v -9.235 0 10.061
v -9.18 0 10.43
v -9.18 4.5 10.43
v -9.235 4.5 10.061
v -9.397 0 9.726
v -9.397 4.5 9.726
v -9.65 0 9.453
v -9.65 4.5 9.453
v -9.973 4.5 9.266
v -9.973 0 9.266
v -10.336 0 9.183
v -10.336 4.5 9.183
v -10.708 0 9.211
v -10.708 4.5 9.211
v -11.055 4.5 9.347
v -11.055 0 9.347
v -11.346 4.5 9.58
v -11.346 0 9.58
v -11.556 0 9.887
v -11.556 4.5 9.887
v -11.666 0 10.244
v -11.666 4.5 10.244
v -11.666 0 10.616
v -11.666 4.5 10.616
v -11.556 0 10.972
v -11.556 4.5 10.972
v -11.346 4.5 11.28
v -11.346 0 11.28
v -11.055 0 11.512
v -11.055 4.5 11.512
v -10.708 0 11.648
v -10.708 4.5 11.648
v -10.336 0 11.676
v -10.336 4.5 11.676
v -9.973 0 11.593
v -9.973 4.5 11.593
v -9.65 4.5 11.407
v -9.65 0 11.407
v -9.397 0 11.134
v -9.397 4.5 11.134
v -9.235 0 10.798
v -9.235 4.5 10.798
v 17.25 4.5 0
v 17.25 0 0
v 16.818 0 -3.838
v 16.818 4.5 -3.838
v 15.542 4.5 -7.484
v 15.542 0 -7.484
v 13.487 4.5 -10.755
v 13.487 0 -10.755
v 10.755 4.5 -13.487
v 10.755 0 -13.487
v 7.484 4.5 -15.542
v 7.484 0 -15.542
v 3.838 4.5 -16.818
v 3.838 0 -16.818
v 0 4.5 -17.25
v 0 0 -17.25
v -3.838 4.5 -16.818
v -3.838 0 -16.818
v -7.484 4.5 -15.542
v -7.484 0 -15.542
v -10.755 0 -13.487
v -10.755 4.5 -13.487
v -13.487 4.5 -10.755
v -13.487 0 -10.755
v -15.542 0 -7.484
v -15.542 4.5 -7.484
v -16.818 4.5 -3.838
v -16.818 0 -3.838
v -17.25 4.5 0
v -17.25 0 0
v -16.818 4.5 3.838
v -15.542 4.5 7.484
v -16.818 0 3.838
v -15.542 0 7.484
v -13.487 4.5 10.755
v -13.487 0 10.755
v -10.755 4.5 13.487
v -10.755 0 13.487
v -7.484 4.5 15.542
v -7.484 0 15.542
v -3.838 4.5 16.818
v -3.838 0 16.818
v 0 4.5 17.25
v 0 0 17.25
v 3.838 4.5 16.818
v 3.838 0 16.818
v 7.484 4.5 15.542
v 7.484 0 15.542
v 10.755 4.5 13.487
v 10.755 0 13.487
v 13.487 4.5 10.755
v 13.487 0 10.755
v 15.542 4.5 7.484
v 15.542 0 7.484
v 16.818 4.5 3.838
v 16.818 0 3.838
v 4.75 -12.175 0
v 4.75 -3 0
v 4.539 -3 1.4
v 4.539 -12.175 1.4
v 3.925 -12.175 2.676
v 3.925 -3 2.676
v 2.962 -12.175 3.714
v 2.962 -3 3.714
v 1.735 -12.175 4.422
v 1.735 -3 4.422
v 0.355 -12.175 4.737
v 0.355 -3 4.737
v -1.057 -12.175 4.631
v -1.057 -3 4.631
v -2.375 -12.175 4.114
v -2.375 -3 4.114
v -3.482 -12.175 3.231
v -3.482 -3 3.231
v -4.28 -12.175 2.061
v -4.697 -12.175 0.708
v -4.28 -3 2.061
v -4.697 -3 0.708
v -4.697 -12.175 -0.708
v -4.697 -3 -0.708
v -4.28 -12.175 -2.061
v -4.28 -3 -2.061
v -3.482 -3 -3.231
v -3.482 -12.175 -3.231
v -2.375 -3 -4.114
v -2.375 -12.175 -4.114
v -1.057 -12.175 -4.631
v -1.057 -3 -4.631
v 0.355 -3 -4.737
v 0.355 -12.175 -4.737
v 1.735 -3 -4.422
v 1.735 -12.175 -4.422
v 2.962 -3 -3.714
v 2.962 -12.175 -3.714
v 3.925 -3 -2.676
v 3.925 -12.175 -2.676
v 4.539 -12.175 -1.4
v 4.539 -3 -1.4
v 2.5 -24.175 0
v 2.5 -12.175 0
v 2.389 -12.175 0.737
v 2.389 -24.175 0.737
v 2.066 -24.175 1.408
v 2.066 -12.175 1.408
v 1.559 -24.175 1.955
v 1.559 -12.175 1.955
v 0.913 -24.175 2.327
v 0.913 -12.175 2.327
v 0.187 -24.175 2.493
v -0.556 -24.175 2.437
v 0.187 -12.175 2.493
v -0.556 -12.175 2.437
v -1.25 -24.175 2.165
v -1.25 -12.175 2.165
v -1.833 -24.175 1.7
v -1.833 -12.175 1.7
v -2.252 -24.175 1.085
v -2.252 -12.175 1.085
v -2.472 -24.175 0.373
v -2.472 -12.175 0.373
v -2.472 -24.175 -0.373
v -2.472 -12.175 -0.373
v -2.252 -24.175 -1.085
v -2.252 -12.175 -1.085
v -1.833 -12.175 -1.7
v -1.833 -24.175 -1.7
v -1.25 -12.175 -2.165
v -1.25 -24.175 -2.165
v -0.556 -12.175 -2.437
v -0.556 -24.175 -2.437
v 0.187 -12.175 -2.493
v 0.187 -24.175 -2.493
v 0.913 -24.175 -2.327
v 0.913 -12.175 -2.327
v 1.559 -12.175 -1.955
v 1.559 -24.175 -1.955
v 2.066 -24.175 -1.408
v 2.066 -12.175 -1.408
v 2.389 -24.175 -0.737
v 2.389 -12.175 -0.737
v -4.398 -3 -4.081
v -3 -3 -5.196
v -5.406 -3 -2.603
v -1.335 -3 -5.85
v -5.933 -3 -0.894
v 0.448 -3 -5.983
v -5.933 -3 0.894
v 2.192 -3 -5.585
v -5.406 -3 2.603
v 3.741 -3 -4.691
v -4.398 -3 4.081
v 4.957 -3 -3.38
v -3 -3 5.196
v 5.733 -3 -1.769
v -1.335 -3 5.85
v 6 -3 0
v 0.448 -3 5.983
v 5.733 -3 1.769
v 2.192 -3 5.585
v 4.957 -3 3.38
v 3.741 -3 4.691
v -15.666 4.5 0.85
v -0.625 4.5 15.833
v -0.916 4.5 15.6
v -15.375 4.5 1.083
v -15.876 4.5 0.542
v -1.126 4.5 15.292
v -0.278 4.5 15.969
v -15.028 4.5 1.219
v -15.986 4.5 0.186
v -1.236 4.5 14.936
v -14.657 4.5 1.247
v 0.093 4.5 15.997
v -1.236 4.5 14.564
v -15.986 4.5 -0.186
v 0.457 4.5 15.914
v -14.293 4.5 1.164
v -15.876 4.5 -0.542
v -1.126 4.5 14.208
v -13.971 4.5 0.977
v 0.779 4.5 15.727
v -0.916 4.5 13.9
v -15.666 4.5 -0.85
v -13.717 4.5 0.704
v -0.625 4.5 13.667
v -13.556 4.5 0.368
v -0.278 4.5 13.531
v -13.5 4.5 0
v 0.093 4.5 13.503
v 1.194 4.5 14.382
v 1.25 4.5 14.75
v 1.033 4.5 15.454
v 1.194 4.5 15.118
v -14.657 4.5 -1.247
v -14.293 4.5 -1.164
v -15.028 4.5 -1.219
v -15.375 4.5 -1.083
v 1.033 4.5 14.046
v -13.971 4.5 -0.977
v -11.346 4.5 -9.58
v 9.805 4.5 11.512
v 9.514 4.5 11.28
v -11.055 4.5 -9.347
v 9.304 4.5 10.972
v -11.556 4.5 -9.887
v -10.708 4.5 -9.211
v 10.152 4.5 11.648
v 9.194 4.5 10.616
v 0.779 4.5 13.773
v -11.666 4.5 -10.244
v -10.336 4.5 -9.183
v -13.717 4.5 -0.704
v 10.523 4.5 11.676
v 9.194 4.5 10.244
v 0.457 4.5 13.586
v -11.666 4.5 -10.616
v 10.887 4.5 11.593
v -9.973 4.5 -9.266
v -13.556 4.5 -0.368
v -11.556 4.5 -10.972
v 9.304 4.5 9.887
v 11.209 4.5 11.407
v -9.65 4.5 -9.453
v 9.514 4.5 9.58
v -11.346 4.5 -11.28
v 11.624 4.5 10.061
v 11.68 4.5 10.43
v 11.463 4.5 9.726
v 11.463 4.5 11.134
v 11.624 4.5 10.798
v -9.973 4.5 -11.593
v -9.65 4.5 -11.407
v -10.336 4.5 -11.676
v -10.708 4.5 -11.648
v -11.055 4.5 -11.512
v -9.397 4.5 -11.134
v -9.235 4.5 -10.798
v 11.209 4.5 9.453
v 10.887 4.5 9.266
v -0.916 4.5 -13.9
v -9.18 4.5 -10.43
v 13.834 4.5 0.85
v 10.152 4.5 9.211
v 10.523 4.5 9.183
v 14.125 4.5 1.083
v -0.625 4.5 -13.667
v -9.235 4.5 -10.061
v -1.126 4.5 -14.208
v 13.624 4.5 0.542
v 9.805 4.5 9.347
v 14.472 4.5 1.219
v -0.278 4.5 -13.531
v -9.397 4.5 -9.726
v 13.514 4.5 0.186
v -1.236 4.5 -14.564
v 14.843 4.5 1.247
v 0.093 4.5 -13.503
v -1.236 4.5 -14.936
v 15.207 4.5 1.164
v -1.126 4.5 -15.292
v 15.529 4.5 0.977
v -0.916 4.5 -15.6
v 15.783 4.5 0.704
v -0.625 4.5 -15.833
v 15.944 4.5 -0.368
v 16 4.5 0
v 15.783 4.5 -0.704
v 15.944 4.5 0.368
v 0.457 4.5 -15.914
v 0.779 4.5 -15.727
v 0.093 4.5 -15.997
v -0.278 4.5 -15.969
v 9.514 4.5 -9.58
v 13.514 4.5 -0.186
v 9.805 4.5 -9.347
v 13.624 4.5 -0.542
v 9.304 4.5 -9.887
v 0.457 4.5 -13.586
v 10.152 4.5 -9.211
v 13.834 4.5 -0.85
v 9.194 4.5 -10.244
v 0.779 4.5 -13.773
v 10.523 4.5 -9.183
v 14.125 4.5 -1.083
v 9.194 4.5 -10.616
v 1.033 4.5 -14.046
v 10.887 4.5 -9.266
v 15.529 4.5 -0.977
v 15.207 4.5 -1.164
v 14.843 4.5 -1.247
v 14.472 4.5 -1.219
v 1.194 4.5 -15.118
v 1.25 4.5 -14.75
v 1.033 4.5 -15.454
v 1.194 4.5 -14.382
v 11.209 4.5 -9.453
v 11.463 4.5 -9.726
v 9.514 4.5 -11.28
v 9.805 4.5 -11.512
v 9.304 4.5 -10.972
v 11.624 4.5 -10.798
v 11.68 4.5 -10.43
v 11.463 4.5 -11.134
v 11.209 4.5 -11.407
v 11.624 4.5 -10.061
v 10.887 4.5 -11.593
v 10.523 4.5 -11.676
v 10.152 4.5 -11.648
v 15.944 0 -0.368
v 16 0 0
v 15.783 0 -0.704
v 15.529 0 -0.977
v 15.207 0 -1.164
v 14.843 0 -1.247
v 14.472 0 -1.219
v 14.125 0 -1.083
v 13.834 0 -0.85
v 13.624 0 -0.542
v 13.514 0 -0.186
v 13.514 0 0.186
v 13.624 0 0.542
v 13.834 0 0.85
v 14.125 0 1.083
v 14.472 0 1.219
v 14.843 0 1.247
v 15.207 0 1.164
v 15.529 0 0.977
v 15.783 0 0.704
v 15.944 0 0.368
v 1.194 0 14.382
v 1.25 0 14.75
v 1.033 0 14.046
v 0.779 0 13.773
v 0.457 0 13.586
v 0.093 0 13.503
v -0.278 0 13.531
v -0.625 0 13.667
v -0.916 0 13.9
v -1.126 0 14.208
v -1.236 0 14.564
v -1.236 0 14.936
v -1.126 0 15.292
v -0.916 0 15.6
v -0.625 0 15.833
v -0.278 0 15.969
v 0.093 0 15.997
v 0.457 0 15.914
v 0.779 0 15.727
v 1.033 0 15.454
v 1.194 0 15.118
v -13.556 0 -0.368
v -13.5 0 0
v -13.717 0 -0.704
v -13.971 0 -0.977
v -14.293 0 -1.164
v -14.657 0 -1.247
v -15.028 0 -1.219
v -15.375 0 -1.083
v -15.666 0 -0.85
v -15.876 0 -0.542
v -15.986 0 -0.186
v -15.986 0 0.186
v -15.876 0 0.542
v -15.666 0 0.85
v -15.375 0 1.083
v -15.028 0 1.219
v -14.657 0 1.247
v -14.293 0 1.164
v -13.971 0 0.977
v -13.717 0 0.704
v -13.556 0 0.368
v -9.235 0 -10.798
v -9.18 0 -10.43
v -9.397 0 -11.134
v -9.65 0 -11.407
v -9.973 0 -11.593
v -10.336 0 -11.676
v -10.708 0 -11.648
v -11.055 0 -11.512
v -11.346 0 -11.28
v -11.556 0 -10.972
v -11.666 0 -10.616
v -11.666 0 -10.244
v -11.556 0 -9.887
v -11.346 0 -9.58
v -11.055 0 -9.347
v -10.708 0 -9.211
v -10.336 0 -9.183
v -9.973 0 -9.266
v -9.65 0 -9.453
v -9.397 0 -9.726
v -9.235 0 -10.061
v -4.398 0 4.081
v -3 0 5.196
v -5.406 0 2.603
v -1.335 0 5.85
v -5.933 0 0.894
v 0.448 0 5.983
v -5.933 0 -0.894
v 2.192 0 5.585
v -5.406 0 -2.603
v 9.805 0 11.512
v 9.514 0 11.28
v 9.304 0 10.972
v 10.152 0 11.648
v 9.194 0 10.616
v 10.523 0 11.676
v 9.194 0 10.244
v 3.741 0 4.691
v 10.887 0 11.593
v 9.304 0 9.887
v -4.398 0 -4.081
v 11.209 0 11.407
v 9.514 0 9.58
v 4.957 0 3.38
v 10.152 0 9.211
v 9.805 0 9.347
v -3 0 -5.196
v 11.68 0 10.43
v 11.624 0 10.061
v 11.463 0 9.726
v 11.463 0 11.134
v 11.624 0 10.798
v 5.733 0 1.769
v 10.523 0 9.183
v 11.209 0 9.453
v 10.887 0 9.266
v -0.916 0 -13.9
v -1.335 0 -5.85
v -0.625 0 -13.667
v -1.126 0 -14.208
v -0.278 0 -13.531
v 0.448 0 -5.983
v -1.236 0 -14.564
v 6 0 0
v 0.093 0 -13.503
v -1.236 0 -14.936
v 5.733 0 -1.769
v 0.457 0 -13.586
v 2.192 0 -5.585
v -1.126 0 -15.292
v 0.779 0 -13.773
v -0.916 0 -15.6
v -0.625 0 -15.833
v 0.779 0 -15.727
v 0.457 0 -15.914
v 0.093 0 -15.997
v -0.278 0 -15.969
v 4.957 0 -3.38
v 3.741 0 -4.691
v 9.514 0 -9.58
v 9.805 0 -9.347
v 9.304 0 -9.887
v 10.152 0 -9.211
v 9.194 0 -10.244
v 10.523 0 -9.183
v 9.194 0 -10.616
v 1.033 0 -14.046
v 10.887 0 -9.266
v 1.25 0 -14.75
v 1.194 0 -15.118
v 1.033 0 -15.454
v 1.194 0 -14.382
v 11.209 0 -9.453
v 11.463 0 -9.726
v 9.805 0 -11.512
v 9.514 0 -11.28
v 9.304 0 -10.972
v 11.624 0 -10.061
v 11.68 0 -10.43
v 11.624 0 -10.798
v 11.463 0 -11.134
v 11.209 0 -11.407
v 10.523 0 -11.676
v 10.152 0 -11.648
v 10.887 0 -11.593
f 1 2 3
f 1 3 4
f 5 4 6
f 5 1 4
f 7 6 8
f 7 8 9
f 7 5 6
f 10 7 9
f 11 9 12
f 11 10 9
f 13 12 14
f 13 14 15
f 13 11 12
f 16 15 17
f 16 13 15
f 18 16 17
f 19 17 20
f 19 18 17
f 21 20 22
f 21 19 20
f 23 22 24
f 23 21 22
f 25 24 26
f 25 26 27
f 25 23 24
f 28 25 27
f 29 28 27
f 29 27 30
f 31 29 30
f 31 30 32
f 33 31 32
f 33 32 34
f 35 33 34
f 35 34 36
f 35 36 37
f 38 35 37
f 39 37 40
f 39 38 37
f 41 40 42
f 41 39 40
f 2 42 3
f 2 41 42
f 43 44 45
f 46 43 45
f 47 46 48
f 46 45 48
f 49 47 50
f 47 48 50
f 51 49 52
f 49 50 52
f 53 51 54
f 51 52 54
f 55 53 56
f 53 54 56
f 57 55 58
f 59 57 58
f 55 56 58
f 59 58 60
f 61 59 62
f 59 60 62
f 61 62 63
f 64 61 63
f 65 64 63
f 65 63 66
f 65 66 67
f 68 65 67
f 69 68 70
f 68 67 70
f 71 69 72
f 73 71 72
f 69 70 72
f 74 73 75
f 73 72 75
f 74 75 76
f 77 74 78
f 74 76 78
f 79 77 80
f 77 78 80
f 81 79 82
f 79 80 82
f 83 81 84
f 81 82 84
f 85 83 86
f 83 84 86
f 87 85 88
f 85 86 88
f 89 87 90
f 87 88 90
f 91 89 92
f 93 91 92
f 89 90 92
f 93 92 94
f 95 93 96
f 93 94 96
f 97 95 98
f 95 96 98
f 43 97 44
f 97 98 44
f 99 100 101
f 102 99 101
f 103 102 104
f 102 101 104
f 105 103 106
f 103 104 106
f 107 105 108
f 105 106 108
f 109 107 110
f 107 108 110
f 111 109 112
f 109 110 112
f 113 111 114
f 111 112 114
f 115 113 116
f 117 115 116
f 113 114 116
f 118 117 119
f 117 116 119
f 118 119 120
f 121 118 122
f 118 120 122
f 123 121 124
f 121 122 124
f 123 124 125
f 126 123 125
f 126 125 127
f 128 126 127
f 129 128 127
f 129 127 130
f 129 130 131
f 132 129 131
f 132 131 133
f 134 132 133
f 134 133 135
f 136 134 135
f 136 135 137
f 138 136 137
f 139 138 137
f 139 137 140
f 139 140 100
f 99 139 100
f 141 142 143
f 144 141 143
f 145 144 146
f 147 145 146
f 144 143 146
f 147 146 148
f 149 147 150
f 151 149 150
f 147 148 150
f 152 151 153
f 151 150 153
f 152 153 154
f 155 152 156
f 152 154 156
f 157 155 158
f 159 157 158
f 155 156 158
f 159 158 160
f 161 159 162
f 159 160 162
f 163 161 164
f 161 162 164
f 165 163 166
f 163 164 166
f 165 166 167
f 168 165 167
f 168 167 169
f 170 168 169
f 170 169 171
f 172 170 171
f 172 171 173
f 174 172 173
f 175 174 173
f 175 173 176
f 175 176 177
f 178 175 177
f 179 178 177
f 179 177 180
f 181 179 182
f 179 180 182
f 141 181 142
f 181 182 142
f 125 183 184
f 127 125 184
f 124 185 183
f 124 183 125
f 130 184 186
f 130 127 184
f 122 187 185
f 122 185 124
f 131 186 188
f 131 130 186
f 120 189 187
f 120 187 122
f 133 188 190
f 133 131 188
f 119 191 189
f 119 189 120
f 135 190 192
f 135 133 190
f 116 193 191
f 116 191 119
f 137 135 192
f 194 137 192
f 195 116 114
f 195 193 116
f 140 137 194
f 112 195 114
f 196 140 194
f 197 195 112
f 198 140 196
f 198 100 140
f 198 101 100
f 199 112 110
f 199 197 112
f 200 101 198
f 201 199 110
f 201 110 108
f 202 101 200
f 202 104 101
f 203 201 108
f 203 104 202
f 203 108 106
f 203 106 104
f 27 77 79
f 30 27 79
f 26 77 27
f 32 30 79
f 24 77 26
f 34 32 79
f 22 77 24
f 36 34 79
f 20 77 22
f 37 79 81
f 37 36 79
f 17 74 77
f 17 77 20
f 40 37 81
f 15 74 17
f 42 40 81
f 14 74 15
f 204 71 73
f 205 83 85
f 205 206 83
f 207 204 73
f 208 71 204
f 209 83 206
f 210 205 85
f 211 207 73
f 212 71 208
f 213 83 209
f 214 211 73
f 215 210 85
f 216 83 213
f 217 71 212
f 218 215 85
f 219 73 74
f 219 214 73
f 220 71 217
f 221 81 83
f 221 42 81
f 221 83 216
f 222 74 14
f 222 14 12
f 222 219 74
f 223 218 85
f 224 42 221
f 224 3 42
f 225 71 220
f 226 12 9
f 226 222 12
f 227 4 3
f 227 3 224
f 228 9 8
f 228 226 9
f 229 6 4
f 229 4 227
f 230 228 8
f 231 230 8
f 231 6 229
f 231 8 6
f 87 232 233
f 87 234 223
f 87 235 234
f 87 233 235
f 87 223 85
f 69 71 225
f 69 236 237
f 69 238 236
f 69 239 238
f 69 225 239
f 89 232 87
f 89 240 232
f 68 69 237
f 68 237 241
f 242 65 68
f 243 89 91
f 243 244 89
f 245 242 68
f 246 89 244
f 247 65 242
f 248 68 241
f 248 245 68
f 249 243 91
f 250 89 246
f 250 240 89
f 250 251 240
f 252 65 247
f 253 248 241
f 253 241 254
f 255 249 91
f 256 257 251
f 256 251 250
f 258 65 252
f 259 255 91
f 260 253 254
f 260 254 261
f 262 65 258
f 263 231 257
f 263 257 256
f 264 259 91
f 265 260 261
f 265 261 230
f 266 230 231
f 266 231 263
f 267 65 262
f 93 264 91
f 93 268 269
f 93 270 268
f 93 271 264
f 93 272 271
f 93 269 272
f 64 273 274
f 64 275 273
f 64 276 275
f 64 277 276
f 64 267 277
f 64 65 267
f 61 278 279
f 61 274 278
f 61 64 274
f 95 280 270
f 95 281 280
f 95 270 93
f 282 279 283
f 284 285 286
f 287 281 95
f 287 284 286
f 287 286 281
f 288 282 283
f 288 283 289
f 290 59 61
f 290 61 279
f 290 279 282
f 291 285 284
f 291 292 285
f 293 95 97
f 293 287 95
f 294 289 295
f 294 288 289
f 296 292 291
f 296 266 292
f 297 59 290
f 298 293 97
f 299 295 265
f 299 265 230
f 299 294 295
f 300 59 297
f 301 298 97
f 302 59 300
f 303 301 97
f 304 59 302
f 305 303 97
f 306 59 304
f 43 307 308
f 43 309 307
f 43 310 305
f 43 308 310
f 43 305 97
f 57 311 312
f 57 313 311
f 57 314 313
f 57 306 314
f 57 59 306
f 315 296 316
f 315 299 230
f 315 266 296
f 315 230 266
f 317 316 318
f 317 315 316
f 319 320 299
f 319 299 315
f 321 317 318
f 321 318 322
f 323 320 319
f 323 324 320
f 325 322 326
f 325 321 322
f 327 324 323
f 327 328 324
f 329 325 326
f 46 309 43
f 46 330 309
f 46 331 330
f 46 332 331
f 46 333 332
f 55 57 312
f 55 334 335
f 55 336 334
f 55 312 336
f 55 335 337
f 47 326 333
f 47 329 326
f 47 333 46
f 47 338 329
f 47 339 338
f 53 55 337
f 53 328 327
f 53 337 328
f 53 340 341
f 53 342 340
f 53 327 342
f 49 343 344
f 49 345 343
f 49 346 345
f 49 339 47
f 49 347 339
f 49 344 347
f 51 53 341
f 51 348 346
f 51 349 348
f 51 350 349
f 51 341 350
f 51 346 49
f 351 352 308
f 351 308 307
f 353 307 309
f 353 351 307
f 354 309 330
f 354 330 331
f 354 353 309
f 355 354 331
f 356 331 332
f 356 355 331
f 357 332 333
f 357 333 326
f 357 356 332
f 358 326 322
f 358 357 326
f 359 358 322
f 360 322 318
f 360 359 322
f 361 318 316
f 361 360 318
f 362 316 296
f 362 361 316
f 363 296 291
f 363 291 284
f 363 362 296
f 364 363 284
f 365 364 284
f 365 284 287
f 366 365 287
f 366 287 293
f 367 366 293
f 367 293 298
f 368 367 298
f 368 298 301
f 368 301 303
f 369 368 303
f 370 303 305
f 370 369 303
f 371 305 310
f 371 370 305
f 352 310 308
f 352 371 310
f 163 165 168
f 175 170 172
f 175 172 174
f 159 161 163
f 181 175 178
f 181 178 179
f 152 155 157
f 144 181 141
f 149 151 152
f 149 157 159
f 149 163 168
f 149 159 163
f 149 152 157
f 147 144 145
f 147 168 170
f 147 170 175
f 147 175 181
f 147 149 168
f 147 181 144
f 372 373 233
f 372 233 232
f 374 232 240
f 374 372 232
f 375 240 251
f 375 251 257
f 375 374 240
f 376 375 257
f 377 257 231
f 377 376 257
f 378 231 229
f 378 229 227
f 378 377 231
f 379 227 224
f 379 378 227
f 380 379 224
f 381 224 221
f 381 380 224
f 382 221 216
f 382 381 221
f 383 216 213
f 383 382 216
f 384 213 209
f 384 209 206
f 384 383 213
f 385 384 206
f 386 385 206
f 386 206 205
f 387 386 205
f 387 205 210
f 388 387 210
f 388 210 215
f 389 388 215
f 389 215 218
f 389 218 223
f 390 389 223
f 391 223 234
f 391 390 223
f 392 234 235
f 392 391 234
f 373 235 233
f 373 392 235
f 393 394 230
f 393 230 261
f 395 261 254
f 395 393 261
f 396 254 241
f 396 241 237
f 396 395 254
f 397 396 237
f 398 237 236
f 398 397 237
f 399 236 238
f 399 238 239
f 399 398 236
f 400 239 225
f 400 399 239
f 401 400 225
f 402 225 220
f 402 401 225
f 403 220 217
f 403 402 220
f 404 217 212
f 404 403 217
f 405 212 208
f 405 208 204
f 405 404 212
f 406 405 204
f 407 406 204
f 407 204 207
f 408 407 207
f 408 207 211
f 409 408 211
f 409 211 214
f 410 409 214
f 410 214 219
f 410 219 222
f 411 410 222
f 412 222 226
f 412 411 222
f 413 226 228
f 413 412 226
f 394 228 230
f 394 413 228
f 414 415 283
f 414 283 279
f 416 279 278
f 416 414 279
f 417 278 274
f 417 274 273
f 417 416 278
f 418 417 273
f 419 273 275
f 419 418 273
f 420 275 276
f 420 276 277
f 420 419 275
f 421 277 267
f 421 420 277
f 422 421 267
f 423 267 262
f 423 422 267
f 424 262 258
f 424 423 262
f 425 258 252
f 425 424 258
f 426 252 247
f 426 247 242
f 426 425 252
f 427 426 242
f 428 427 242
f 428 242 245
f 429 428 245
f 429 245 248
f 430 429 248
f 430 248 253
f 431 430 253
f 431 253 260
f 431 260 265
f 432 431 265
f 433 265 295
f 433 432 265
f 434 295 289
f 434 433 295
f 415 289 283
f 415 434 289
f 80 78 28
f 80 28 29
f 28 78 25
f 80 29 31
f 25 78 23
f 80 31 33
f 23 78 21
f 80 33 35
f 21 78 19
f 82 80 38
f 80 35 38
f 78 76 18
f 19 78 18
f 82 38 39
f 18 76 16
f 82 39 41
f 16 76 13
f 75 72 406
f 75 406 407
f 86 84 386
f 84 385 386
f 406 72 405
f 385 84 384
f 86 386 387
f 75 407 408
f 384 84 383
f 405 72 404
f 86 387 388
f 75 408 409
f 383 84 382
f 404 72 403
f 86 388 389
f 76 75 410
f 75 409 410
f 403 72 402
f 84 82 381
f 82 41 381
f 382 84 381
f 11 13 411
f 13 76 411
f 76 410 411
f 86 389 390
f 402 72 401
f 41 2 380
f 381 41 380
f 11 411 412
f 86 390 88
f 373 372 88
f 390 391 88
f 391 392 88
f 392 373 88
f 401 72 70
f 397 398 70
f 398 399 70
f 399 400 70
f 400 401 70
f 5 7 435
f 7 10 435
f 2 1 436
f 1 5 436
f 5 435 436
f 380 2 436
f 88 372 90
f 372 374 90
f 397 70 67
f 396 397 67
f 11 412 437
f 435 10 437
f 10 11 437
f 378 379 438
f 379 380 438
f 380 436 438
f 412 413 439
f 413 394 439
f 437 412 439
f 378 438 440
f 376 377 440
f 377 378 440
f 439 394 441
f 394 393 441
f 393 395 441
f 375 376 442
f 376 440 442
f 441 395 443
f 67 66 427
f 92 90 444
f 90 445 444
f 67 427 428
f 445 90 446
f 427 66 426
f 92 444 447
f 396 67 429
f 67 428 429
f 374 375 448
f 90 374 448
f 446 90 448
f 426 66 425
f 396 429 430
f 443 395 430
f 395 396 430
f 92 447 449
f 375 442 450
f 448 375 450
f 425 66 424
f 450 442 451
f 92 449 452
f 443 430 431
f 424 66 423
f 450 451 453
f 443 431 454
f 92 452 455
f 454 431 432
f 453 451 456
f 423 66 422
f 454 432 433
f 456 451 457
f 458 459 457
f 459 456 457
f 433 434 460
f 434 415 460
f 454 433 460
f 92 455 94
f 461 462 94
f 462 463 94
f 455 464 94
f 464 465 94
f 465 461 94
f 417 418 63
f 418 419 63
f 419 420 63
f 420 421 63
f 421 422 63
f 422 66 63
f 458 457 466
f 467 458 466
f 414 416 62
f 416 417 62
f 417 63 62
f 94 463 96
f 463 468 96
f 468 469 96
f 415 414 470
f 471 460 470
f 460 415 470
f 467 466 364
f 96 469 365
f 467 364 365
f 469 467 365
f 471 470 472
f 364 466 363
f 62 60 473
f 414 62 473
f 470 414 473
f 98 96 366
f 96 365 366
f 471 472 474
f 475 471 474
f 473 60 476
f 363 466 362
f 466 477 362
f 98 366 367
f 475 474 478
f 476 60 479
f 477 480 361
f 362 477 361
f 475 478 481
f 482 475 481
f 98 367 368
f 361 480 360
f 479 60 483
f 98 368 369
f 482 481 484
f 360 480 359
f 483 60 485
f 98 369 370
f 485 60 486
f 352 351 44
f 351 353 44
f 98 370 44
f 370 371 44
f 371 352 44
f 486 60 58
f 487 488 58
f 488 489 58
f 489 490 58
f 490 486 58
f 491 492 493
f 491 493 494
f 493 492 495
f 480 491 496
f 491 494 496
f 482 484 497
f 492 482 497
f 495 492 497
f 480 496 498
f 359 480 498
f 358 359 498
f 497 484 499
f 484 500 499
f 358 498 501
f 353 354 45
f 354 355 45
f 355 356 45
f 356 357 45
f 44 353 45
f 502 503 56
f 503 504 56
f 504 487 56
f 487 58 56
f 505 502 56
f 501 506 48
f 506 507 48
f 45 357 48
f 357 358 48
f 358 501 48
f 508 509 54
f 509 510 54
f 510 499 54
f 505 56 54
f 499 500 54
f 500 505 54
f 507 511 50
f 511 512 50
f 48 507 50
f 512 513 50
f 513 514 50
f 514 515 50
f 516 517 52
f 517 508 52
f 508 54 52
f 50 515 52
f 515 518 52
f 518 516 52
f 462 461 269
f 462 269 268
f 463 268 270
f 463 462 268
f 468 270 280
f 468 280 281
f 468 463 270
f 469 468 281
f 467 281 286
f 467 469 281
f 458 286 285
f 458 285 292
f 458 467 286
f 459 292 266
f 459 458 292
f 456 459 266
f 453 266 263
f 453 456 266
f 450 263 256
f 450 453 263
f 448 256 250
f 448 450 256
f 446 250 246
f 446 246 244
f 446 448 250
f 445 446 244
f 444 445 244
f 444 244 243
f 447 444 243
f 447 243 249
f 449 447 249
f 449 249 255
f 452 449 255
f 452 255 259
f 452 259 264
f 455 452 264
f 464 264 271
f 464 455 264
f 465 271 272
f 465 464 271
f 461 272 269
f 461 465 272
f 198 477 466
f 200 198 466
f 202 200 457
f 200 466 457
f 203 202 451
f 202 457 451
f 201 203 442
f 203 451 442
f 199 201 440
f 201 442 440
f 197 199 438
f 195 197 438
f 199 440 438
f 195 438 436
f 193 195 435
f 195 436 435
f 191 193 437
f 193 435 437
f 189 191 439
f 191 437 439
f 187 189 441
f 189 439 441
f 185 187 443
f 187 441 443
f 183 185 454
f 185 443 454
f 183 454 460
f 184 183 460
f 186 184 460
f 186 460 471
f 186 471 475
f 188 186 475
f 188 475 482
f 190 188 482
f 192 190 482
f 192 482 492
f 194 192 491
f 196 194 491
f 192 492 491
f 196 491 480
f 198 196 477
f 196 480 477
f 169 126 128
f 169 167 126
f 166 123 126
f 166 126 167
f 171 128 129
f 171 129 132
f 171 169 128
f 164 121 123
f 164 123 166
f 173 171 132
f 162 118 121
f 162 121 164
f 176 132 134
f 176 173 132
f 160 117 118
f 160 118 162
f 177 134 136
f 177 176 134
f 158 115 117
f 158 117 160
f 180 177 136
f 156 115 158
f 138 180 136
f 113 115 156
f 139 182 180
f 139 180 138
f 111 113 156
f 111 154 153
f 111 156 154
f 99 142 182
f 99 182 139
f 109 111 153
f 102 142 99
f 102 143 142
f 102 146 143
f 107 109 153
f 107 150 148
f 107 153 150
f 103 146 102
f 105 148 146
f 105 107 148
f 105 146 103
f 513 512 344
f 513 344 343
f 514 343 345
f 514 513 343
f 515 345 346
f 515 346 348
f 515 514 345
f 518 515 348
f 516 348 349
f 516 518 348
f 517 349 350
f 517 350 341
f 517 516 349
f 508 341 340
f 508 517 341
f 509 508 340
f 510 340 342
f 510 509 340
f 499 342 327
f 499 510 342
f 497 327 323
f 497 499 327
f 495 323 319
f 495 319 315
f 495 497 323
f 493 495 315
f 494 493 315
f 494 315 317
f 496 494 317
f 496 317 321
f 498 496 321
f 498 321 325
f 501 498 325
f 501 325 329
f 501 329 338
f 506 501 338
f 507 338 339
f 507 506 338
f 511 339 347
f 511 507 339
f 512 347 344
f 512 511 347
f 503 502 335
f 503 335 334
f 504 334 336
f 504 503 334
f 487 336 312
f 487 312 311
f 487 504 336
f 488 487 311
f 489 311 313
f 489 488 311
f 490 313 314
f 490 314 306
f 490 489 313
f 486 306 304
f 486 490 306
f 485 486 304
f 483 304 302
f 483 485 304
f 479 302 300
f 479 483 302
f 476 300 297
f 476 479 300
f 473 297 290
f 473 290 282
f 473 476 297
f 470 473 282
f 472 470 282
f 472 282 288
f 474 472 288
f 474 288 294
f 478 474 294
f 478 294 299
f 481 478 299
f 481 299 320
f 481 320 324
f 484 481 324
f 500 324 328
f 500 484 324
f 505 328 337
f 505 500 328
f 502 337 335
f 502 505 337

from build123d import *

# Parameters (mm, degrees)
CROQUIS1_R              = 17.25
CROQUIS1_R_2            = 1.25
SALIENTE_EXTRUIR1_DEPTH = 4.5
CROQUIS3_R              = 4.75
SALIENTE_EXTRUIR3_DEPTH = 12.175
CROQUIS4_R              = 6
SALIENTE_EXTRUIR4_DEPTH = 3
CROQUIS5_R              = 2.5
SALIENTE_EXTRUIR5_DEPTH = 12


with BuildPart() as part:
    # Croquis1 → Saliente-Extruir1 (new body)
    with BuildSketch(Plane(origin=(0, 0, 0), x_dir=(1, 0, 0), z_dir=(0, 1, 0))):
        Circle(CROQUIS1_R)
        with Locations((14.75, 0)):
            Circle(CROQUIS1_R_2, mode=Mode.SUBTRACT)
        with Locations((10.429825023, -10.429825023)):
            Circle(CROQUIS1_R_2, mode=Mode.SUBTRACT)
        with Locations((0, -14.75)):
            Circle(CROQUIS1_R_2, mode=Mode.SUBTRACT)
        with Locations((-10.429825023, -10.429825023)):
            Circle(CROQUIS1_R_2, mode=Mode.SUBTRACT)
        with Locations((-14.75, 0)):
            Circle(CROQUIS1_R_2, mode=Mode.SUBTRACT)
        with Locations((-10.429825023, 10.429825023)):
            Circle(CROQUIS1_R_2, mode=Mode.SUBTRACT)
        with Locations((0, 14.75)):
            Circle(CROQUIS1_R_2, mode=Mode.SUBTRACT)
        with Locations((10.429825023, 10.429825023)):
            Circle(CROQUIS1_R_2, mode=Mode.SUBTRACT)
    extrude(amount=SALIENTE_EXTRUIR1_DEPTH)

    # Croquis3 → Saliente-Extruir3 (add)
    with BuildSketch(Plane.XZ):
        Circle(CROQUIS3_R)
    extrude(amount=SALIENTE_EXTRUIR3_DEPTH)

    # Croquis4 → Saliente-Extruir4 (add)
    with BuildSketch(Plane.XZ):
        Circle(CROQUIS4_R)
    extrude(amount=SALIENTE_EXTRUIR4_DEPTH)

    # Croquis5 → Saliente-Extruir5 (add)
    with BuildSketch(Plane.XZ.offset(12.175)):
        Circle(CROQUIS5_R)
    extrude(amount=SALIENTE_EXTRUIR5_DEPTH)


solid = part.part
